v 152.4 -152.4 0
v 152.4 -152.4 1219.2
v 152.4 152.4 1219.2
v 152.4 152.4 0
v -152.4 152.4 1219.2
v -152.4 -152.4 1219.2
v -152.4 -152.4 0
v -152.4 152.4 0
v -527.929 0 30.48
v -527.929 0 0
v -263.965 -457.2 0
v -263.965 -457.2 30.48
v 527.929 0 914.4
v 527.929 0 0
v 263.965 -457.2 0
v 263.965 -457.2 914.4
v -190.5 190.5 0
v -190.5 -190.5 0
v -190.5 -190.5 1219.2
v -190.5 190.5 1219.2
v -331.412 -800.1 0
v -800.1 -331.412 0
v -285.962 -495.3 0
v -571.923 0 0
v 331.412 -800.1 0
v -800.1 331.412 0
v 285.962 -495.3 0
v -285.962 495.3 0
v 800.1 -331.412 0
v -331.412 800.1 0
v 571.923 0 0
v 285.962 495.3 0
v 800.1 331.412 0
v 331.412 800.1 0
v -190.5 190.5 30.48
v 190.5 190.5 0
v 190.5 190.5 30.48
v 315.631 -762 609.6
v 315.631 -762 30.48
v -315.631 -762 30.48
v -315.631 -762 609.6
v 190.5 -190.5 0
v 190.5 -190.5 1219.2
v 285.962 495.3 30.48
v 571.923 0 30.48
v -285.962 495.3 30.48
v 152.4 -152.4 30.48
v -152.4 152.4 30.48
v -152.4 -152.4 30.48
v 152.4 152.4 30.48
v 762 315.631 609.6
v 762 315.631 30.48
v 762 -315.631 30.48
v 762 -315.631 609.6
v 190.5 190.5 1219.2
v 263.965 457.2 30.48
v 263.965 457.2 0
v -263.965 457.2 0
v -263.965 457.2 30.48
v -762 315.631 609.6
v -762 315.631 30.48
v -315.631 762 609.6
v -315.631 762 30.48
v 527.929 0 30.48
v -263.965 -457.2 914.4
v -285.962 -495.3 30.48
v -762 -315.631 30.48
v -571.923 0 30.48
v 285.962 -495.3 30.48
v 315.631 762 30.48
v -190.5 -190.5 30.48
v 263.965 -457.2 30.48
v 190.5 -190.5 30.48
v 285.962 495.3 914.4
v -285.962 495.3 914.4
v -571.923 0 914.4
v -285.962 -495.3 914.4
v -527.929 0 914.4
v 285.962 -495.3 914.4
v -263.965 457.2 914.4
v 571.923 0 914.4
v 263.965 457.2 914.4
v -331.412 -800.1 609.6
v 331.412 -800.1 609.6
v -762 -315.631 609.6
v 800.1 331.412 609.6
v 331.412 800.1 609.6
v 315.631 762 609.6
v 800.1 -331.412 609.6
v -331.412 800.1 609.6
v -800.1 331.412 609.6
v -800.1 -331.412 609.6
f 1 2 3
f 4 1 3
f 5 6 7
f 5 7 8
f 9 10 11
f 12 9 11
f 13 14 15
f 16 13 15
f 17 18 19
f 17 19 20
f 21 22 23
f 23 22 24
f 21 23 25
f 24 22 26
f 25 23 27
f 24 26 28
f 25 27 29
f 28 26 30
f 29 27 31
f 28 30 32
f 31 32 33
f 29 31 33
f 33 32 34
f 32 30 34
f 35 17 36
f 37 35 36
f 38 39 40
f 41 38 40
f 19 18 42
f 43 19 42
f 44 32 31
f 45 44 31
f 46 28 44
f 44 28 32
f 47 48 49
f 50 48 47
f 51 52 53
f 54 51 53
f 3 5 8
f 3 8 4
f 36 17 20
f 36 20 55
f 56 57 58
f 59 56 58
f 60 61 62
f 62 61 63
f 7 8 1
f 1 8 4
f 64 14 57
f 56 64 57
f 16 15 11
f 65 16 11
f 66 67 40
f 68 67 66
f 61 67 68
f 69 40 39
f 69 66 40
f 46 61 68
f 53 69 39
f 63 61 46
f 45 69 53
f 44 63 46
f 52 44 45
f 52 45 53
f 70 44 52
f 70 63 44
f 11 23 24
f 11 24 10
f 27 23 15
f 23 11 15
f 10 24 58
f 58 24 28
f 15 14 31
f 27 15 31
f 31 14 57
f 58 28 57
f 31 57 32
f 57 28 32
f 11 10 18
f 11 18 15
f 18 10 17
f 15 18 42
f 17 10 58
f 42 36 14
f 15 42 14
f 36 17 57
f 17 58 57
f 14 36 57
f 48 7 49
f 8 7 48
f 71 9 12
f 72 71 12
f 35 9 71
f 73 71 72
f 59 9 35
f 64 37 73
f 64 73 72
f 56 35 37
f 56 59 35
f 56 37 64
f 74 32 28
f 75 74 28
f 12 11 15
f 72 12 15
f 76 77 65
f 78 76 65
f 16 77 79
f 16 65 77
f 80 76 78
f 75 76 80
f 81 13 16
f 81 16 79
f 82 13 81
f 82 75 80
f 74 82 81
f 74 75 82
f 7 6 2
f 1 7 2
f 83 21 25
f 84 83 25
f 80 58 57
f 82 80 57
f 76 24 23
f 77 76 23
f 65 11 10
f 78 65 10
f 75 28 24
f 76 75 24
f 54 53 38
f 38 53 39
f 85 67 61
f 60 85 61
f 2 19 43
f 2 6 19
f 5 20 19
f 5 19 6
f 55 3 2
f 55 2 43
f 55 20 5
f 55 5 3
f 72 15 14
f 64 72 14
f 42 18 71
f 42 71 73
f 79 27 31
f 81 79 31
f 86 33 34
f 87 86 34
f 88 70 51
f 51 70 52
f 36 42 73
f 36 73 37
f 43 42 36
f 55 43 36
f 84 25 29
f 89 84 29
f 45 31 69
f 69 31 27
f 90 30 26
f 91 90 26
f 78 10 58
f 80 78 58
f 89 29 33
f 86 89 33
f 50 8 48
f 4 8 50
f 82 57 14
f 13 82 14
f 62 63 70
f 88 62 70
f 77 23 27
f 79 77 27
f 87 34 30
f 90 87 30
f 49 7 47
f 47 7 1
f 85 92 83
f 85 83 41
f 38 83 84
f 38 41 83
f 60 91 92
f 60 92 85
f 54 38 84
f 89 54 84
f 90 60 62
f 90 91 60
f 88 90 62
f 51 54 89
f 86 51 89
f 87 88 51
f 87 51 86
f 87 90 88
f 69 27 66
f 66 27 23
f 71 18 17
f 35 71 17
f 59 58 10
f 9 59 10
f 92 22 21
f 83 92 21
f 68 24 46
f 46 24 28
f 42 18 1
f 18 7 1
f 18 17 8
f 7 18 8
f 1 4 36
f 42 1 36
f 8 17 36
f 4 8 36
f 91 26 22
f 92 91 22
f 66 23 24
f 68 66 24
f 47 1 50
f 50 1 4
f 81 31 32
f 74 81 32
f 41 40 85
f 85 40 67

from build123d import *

# Parameters (mm, degrees)
F0_W     = 381
F0_H     = 381
F0_W_2   = 304.8
F0_H_2   = 304.8
F1_DEPTH = 30.48
F2_DEPTH = 1219.2
F3_DEPTH = 914.4
F4_DEPTH = 609.6


with BuildPart() as f1:
    # F0 (on Top) → F1 (new body)
    with BuildSketch(Plane.XY):
        Polygon((-315.630735, -762), (315.630735, -762), (762, -315.630735), (762, 315.630735), (315.630735, 762), (-315.630735, 762), (-762, 315.630735), (-762, -315.630735), align=None)
        Polygon((571.923177, 0), (285.961588, -495.3), (-285.961588, -495.3), (-571.923177, 0), (-285.961588, 495.3), (285.961588, 495.3), align=None, mode=Mode.SUBTRACT)
        Polygon((-263.964543, -457.2), (263.964543, -457.2), (527.929086, 0), (263.964543, 457.2), (-263.964543, 457.2), (-527.929086, 0), align=None)
        Rectangle(F0_W, F0_H, mode=Mode.SUBTRACT)
        Rectangle(F0_W_2, F0_H_2)
    extrude(amount=F1_DEPTH)

    # F0 (on Top) → F4 (join)
    with BuildSketch(Plane.XY):
        Polygon((-331.412271, -800.1), (331.412271, -800.1), (800.1, -331.412271), (800.1, 331.412271), (331.412271, 800.1), (-331.412271, 800.1), (-800.1, 331.412271), (-800.1, -331.412271), align=None)
        Polygon((762, -315.630735), (315.630735, -762), (-315.630735, -762), (-762, -315.630735), (-762, 315.630735), (-315.630735, 762), (315.630735, 762), (762, 315.630735), align=None, mode=Mode.SUBTRACT)
    extrude(amount=F4_DEPTH)


with BuildPart() as f2:
    # F0 (on Top) → F2 (new body)
    with BuildSketch(Plane.XY):
        Rectangle(F0_W, F0_H)
        Rectangle(F0_W_2, F0_H_2, mode=Mode.SUBTRACT)
    extrude(amount=F2_DEPTH)


with BuildPart() as f3:
    # F0 (on Top) → F3 (new body)
    with BuildSketch(Plane.XY):
        Polygon((-285.961588, -495.3), (285.961588, -495.3), (571.923177, 0), (285.961588, 495.3), (-285.961588, 495.3), (-571.923177, 0), align=None)
        Polygon((527.929086, 0), (263.964543, -457.2), (-263.964543, -457.2), (-527.929086, 0), (-263.964543, 457.2), (263.964543, 457.2), align=None, mode=Mode.SUBTRACT)
    extrude(amount=F3_DEPTH)


solid = Compound([f1.part, f2.part, f3.part])
